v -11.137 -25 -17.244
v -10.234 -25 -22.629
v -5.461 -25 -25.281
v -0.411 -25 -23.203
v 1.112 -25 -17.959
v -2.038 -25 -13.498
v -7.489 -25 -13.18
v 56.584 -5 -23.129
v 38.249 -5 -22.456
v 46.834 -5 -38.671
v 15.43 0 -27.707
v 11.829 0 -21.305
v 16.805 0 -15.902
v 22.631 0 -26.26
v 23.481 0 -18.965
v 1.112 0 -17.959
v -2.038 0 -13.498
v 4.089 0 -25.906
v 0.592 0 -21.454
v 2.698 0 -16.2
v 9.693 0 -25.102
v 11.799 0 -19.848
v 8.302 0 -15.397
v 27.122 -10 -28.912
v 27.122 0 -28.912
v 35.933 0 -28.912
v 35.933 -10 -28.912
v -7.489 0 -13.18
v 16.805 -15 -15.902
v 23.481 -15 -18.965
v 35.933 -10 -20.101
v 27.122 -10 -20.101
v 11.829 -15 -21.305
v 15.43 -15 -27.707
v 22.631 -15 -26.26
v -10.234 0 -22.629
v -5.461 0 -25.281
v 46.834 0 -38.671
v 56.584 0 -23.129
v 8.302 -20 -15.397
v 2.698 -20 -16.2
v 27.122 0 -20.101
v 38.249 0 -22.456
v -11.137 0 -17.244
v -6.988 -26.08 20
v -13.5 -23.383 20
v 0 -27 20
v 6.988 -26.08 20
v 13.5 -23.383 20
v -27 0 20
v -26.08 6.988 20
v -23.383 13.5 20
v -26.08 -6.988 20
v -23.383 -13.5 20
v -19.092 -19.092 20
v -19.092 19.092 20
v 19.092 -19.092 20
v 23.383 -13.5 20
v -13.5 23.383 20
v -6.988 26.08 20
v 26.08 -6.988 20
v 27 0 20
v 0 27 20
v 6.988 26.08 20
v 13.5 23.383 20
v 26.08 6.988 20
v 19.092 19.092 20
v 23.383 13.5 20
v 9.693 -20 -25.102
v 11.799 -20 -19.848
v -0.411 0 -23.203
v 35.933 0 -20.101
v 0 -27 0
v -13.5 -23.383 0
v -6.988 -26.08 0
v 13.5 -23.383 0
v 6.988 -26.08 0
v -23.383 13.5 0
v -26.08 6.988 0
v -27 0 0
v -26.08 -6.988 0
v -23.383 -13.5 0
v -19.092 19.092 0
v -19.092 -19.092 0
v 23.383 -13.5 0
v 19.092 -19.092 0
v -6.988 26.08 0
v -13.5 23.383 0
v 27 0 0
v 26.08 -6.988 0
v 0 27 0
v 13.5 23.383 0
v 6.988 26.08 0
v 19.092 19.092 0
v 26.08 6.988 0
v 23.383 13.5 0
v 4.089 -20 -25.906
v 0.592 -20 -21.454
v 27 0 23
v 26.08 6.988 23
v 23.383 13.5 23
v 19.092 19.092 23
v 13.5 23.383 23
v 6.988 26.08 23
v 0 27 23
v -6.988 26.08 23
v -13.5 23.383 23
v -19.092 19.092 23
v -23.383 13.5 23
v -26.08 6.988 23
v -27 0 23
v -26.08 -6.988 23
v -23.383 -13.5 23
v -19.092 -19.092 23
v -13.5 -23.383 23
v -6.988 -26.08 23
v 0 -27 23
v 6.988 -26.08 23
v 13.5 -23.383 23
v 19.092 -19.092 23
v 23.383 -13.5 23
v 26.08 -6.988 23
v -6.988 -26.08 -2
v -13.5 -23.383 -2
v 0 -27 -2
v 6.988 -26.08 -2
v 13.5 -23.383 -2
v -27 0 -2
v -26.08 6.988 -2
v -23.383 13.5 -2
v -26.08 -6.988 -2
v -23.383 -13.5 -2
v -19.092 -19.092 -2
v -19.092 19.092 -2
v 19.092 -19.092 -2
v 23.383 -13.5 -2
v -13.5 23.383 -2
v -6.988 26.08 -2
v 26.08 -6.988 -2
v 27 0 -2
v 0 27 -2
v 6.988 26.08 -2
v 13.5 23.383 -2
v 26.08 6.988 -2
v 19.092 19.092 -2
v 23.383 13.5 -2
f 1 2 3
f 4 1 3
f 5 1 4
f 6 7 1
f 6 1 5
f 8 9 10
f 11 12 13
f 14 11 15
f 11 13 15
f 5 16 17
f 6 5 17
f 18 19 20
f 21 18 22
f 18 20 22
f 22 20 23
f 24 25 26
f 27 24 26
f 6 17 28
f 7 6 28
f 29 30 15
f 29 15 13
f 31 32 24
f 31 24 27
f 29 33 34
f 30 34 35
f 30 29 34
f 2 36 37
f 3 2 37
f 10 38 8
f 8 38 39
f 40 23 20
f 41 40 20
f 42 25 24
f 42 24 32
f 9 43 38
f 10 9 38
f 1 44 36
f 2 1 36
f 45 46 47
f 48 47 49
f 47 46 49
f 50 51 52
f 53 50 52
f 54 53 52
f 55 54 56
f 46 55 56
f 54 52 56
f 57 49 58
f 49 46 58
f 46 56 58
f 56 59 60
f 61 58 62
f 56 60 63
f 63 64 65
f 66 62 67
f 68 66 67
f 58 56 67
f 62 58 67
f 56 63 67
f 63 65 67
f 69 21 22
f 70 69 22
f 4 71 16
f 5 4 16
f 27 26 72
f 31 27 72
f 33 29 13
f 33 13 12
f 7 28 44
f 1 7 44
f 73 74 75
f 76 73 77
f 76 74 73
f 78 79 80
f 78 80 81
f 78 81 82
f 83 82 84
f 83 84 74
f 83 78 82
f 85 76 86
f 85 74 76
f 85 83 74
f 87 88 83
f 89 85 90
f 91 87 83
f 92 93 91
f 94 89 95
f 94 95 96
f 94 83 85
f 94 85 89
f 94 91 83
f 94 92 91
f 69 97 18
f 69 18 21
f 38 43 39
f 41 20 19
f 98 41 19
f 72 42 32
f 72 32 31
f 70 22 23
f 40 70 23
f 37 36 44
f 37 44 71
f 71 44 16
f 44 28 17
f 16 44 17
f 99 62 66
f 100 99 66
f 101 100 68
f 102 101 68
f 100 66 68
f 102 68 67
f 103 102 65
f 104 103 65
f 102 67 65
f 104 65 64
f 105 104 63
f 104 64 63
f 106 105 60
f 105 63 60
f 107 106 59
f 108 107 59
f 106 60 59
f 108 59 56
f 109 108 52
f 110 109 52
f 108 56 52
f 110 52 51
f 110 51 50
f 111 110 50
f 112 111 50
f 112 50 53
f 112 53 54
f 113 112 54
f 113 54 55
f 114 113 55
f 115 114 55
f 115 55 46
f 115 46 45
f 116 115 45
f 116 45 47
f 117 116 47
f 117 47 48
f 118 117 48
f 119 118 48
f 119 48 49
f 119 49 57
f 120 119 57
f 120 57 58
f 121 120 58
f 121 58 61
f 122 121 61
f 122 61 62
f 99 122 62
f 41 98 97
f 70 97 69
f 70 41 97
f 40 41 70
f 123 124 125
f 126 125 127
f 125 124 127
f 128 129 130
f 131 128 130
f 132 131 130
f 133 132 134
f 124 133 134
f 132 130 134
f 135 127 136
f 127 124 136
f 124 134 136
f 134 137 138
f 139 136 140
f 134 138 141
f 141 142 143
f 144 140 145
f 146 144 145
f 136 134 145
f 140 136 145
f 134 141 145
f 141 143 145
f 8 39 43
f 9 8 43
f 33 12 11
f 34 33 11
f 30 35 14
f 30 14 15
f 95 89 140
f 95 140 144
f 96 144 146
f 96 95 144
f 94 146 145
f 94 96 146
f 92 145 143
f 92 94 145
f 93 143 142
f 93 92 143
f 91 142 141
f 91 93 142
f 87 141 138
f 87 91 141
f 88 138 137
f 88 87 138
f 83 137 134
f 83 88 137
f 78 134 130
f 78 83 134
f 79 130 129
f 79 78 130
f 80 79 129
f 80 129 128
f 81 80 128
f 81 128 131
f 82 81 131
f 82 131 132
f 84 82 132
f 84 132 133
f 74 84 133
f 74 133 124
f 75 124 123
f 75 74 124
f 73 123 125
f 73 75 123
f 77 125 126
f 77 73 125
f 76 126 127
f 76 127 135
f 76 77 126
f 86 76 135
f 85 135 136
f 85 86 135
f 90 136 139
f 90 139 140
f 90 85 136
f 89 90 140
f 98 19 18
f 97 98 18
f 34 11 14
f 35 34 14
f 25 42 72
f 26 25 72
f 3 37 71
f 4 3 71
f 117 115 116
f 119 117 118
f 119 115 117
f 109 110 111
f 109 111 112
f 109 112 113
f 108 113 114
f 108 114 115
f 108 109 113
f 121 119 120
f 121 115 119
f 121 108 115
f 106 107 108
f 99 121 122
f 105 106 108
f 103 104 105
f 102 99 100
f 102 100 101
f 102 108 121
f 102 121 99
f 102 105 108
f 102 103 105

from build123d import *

# Parameters (mm, degrees)
F0_R      = 27
F1_DEPTH  = 2
F2_DEPTH  = 23
F3_DEPTH  = 20
F5_DEPTH  = 5
F6_W      = 8.81119
F6_H      = 8.81119
F7_DEPTH  = 10
F9_DEPTH  = 15
F11_DEPTH = 20
F13_DEPTH = 25


with BuildPart() as f1:
    # F0 (on Top) → F1 (new body)
    with BuildSketch(Plane.XY):
        Circle(F0_R)
    extrude(amount=-F1_DEPTH)


with BuildPart() as f2:
    # F0 (on Top) → F2 (new body)
    with BuildSketch(Plane.XY):
        Circle(F0_R)
    extrude(amount=F2_DEPTH)

    # F0 (on Top) → F3 (cut)
    with BuildSketch(Plane.XY):
        Circle(F0_R)
    extrude(amount=F3_DEPTH, mode=Mode.SUBTRACT)


with BuildPart() as f5:
    # F4 (on Front) → F5 (new body)
    with BuildSketch(Plane.XZ):
        Polygon((38.24924, -22.456184), (46.833805, -38.671445), (56.584351, -23.129363), align=None)
    extrude(amount=F5_DEPTH)


with BuildPart() as f7:
    # F6 (on Front) → F7 (new body)
    with BuildSketch(Plane.XZ):
        with Locations((31.527534, -24.50612)):
            Rectangle(F6_W, F6_H)
    extrude(amount=F7_DEPTH)


with BuildPart() as f9:
    # F8 (on Front) → F9 (new body)
    with BuildSketch(Plane.XZ):
        Polygon((11.829331, -21.305269), (15.430287, -27.706971), (22.631424, -26.260494), (23.481016, -18.964819), (16.804955, -15.902322), align=None)
    extrude(amount=F9_DEPTH)


with BuildPart() as f11:
    # F10 (on Front) → F11 (new body)
    with BuildSketch(Plane.XZ):
        Polygon((0.591765, -21.454447), (4.089179, -25.905697), (9.692781, -25.102473), (11.798969, -19.847999), (8.301556, -15.396749), (2.697954, -16.199974), align=None)
    extrude(amount=F11_DEPTH)


with BuildPart() as f13:
    # F12 (on Front) → F13 (new body)
    with BuildSketch(Plane.XZ):
        Polygon((-10.234291, -22.629406), (-5.46064, -25.281434), (-0.410879, -23.202756), (1.11242, -17.958659), (-2.037818, -13.498055), (-7.489401, -13.179869), (-11.137174, -17.243703), align=None)
    extrude(amount=F13_DEPTH)


solid = Compound([f1.part, f2.part, f5.part, f7.part, f9.part, f11.part, f13.part])
